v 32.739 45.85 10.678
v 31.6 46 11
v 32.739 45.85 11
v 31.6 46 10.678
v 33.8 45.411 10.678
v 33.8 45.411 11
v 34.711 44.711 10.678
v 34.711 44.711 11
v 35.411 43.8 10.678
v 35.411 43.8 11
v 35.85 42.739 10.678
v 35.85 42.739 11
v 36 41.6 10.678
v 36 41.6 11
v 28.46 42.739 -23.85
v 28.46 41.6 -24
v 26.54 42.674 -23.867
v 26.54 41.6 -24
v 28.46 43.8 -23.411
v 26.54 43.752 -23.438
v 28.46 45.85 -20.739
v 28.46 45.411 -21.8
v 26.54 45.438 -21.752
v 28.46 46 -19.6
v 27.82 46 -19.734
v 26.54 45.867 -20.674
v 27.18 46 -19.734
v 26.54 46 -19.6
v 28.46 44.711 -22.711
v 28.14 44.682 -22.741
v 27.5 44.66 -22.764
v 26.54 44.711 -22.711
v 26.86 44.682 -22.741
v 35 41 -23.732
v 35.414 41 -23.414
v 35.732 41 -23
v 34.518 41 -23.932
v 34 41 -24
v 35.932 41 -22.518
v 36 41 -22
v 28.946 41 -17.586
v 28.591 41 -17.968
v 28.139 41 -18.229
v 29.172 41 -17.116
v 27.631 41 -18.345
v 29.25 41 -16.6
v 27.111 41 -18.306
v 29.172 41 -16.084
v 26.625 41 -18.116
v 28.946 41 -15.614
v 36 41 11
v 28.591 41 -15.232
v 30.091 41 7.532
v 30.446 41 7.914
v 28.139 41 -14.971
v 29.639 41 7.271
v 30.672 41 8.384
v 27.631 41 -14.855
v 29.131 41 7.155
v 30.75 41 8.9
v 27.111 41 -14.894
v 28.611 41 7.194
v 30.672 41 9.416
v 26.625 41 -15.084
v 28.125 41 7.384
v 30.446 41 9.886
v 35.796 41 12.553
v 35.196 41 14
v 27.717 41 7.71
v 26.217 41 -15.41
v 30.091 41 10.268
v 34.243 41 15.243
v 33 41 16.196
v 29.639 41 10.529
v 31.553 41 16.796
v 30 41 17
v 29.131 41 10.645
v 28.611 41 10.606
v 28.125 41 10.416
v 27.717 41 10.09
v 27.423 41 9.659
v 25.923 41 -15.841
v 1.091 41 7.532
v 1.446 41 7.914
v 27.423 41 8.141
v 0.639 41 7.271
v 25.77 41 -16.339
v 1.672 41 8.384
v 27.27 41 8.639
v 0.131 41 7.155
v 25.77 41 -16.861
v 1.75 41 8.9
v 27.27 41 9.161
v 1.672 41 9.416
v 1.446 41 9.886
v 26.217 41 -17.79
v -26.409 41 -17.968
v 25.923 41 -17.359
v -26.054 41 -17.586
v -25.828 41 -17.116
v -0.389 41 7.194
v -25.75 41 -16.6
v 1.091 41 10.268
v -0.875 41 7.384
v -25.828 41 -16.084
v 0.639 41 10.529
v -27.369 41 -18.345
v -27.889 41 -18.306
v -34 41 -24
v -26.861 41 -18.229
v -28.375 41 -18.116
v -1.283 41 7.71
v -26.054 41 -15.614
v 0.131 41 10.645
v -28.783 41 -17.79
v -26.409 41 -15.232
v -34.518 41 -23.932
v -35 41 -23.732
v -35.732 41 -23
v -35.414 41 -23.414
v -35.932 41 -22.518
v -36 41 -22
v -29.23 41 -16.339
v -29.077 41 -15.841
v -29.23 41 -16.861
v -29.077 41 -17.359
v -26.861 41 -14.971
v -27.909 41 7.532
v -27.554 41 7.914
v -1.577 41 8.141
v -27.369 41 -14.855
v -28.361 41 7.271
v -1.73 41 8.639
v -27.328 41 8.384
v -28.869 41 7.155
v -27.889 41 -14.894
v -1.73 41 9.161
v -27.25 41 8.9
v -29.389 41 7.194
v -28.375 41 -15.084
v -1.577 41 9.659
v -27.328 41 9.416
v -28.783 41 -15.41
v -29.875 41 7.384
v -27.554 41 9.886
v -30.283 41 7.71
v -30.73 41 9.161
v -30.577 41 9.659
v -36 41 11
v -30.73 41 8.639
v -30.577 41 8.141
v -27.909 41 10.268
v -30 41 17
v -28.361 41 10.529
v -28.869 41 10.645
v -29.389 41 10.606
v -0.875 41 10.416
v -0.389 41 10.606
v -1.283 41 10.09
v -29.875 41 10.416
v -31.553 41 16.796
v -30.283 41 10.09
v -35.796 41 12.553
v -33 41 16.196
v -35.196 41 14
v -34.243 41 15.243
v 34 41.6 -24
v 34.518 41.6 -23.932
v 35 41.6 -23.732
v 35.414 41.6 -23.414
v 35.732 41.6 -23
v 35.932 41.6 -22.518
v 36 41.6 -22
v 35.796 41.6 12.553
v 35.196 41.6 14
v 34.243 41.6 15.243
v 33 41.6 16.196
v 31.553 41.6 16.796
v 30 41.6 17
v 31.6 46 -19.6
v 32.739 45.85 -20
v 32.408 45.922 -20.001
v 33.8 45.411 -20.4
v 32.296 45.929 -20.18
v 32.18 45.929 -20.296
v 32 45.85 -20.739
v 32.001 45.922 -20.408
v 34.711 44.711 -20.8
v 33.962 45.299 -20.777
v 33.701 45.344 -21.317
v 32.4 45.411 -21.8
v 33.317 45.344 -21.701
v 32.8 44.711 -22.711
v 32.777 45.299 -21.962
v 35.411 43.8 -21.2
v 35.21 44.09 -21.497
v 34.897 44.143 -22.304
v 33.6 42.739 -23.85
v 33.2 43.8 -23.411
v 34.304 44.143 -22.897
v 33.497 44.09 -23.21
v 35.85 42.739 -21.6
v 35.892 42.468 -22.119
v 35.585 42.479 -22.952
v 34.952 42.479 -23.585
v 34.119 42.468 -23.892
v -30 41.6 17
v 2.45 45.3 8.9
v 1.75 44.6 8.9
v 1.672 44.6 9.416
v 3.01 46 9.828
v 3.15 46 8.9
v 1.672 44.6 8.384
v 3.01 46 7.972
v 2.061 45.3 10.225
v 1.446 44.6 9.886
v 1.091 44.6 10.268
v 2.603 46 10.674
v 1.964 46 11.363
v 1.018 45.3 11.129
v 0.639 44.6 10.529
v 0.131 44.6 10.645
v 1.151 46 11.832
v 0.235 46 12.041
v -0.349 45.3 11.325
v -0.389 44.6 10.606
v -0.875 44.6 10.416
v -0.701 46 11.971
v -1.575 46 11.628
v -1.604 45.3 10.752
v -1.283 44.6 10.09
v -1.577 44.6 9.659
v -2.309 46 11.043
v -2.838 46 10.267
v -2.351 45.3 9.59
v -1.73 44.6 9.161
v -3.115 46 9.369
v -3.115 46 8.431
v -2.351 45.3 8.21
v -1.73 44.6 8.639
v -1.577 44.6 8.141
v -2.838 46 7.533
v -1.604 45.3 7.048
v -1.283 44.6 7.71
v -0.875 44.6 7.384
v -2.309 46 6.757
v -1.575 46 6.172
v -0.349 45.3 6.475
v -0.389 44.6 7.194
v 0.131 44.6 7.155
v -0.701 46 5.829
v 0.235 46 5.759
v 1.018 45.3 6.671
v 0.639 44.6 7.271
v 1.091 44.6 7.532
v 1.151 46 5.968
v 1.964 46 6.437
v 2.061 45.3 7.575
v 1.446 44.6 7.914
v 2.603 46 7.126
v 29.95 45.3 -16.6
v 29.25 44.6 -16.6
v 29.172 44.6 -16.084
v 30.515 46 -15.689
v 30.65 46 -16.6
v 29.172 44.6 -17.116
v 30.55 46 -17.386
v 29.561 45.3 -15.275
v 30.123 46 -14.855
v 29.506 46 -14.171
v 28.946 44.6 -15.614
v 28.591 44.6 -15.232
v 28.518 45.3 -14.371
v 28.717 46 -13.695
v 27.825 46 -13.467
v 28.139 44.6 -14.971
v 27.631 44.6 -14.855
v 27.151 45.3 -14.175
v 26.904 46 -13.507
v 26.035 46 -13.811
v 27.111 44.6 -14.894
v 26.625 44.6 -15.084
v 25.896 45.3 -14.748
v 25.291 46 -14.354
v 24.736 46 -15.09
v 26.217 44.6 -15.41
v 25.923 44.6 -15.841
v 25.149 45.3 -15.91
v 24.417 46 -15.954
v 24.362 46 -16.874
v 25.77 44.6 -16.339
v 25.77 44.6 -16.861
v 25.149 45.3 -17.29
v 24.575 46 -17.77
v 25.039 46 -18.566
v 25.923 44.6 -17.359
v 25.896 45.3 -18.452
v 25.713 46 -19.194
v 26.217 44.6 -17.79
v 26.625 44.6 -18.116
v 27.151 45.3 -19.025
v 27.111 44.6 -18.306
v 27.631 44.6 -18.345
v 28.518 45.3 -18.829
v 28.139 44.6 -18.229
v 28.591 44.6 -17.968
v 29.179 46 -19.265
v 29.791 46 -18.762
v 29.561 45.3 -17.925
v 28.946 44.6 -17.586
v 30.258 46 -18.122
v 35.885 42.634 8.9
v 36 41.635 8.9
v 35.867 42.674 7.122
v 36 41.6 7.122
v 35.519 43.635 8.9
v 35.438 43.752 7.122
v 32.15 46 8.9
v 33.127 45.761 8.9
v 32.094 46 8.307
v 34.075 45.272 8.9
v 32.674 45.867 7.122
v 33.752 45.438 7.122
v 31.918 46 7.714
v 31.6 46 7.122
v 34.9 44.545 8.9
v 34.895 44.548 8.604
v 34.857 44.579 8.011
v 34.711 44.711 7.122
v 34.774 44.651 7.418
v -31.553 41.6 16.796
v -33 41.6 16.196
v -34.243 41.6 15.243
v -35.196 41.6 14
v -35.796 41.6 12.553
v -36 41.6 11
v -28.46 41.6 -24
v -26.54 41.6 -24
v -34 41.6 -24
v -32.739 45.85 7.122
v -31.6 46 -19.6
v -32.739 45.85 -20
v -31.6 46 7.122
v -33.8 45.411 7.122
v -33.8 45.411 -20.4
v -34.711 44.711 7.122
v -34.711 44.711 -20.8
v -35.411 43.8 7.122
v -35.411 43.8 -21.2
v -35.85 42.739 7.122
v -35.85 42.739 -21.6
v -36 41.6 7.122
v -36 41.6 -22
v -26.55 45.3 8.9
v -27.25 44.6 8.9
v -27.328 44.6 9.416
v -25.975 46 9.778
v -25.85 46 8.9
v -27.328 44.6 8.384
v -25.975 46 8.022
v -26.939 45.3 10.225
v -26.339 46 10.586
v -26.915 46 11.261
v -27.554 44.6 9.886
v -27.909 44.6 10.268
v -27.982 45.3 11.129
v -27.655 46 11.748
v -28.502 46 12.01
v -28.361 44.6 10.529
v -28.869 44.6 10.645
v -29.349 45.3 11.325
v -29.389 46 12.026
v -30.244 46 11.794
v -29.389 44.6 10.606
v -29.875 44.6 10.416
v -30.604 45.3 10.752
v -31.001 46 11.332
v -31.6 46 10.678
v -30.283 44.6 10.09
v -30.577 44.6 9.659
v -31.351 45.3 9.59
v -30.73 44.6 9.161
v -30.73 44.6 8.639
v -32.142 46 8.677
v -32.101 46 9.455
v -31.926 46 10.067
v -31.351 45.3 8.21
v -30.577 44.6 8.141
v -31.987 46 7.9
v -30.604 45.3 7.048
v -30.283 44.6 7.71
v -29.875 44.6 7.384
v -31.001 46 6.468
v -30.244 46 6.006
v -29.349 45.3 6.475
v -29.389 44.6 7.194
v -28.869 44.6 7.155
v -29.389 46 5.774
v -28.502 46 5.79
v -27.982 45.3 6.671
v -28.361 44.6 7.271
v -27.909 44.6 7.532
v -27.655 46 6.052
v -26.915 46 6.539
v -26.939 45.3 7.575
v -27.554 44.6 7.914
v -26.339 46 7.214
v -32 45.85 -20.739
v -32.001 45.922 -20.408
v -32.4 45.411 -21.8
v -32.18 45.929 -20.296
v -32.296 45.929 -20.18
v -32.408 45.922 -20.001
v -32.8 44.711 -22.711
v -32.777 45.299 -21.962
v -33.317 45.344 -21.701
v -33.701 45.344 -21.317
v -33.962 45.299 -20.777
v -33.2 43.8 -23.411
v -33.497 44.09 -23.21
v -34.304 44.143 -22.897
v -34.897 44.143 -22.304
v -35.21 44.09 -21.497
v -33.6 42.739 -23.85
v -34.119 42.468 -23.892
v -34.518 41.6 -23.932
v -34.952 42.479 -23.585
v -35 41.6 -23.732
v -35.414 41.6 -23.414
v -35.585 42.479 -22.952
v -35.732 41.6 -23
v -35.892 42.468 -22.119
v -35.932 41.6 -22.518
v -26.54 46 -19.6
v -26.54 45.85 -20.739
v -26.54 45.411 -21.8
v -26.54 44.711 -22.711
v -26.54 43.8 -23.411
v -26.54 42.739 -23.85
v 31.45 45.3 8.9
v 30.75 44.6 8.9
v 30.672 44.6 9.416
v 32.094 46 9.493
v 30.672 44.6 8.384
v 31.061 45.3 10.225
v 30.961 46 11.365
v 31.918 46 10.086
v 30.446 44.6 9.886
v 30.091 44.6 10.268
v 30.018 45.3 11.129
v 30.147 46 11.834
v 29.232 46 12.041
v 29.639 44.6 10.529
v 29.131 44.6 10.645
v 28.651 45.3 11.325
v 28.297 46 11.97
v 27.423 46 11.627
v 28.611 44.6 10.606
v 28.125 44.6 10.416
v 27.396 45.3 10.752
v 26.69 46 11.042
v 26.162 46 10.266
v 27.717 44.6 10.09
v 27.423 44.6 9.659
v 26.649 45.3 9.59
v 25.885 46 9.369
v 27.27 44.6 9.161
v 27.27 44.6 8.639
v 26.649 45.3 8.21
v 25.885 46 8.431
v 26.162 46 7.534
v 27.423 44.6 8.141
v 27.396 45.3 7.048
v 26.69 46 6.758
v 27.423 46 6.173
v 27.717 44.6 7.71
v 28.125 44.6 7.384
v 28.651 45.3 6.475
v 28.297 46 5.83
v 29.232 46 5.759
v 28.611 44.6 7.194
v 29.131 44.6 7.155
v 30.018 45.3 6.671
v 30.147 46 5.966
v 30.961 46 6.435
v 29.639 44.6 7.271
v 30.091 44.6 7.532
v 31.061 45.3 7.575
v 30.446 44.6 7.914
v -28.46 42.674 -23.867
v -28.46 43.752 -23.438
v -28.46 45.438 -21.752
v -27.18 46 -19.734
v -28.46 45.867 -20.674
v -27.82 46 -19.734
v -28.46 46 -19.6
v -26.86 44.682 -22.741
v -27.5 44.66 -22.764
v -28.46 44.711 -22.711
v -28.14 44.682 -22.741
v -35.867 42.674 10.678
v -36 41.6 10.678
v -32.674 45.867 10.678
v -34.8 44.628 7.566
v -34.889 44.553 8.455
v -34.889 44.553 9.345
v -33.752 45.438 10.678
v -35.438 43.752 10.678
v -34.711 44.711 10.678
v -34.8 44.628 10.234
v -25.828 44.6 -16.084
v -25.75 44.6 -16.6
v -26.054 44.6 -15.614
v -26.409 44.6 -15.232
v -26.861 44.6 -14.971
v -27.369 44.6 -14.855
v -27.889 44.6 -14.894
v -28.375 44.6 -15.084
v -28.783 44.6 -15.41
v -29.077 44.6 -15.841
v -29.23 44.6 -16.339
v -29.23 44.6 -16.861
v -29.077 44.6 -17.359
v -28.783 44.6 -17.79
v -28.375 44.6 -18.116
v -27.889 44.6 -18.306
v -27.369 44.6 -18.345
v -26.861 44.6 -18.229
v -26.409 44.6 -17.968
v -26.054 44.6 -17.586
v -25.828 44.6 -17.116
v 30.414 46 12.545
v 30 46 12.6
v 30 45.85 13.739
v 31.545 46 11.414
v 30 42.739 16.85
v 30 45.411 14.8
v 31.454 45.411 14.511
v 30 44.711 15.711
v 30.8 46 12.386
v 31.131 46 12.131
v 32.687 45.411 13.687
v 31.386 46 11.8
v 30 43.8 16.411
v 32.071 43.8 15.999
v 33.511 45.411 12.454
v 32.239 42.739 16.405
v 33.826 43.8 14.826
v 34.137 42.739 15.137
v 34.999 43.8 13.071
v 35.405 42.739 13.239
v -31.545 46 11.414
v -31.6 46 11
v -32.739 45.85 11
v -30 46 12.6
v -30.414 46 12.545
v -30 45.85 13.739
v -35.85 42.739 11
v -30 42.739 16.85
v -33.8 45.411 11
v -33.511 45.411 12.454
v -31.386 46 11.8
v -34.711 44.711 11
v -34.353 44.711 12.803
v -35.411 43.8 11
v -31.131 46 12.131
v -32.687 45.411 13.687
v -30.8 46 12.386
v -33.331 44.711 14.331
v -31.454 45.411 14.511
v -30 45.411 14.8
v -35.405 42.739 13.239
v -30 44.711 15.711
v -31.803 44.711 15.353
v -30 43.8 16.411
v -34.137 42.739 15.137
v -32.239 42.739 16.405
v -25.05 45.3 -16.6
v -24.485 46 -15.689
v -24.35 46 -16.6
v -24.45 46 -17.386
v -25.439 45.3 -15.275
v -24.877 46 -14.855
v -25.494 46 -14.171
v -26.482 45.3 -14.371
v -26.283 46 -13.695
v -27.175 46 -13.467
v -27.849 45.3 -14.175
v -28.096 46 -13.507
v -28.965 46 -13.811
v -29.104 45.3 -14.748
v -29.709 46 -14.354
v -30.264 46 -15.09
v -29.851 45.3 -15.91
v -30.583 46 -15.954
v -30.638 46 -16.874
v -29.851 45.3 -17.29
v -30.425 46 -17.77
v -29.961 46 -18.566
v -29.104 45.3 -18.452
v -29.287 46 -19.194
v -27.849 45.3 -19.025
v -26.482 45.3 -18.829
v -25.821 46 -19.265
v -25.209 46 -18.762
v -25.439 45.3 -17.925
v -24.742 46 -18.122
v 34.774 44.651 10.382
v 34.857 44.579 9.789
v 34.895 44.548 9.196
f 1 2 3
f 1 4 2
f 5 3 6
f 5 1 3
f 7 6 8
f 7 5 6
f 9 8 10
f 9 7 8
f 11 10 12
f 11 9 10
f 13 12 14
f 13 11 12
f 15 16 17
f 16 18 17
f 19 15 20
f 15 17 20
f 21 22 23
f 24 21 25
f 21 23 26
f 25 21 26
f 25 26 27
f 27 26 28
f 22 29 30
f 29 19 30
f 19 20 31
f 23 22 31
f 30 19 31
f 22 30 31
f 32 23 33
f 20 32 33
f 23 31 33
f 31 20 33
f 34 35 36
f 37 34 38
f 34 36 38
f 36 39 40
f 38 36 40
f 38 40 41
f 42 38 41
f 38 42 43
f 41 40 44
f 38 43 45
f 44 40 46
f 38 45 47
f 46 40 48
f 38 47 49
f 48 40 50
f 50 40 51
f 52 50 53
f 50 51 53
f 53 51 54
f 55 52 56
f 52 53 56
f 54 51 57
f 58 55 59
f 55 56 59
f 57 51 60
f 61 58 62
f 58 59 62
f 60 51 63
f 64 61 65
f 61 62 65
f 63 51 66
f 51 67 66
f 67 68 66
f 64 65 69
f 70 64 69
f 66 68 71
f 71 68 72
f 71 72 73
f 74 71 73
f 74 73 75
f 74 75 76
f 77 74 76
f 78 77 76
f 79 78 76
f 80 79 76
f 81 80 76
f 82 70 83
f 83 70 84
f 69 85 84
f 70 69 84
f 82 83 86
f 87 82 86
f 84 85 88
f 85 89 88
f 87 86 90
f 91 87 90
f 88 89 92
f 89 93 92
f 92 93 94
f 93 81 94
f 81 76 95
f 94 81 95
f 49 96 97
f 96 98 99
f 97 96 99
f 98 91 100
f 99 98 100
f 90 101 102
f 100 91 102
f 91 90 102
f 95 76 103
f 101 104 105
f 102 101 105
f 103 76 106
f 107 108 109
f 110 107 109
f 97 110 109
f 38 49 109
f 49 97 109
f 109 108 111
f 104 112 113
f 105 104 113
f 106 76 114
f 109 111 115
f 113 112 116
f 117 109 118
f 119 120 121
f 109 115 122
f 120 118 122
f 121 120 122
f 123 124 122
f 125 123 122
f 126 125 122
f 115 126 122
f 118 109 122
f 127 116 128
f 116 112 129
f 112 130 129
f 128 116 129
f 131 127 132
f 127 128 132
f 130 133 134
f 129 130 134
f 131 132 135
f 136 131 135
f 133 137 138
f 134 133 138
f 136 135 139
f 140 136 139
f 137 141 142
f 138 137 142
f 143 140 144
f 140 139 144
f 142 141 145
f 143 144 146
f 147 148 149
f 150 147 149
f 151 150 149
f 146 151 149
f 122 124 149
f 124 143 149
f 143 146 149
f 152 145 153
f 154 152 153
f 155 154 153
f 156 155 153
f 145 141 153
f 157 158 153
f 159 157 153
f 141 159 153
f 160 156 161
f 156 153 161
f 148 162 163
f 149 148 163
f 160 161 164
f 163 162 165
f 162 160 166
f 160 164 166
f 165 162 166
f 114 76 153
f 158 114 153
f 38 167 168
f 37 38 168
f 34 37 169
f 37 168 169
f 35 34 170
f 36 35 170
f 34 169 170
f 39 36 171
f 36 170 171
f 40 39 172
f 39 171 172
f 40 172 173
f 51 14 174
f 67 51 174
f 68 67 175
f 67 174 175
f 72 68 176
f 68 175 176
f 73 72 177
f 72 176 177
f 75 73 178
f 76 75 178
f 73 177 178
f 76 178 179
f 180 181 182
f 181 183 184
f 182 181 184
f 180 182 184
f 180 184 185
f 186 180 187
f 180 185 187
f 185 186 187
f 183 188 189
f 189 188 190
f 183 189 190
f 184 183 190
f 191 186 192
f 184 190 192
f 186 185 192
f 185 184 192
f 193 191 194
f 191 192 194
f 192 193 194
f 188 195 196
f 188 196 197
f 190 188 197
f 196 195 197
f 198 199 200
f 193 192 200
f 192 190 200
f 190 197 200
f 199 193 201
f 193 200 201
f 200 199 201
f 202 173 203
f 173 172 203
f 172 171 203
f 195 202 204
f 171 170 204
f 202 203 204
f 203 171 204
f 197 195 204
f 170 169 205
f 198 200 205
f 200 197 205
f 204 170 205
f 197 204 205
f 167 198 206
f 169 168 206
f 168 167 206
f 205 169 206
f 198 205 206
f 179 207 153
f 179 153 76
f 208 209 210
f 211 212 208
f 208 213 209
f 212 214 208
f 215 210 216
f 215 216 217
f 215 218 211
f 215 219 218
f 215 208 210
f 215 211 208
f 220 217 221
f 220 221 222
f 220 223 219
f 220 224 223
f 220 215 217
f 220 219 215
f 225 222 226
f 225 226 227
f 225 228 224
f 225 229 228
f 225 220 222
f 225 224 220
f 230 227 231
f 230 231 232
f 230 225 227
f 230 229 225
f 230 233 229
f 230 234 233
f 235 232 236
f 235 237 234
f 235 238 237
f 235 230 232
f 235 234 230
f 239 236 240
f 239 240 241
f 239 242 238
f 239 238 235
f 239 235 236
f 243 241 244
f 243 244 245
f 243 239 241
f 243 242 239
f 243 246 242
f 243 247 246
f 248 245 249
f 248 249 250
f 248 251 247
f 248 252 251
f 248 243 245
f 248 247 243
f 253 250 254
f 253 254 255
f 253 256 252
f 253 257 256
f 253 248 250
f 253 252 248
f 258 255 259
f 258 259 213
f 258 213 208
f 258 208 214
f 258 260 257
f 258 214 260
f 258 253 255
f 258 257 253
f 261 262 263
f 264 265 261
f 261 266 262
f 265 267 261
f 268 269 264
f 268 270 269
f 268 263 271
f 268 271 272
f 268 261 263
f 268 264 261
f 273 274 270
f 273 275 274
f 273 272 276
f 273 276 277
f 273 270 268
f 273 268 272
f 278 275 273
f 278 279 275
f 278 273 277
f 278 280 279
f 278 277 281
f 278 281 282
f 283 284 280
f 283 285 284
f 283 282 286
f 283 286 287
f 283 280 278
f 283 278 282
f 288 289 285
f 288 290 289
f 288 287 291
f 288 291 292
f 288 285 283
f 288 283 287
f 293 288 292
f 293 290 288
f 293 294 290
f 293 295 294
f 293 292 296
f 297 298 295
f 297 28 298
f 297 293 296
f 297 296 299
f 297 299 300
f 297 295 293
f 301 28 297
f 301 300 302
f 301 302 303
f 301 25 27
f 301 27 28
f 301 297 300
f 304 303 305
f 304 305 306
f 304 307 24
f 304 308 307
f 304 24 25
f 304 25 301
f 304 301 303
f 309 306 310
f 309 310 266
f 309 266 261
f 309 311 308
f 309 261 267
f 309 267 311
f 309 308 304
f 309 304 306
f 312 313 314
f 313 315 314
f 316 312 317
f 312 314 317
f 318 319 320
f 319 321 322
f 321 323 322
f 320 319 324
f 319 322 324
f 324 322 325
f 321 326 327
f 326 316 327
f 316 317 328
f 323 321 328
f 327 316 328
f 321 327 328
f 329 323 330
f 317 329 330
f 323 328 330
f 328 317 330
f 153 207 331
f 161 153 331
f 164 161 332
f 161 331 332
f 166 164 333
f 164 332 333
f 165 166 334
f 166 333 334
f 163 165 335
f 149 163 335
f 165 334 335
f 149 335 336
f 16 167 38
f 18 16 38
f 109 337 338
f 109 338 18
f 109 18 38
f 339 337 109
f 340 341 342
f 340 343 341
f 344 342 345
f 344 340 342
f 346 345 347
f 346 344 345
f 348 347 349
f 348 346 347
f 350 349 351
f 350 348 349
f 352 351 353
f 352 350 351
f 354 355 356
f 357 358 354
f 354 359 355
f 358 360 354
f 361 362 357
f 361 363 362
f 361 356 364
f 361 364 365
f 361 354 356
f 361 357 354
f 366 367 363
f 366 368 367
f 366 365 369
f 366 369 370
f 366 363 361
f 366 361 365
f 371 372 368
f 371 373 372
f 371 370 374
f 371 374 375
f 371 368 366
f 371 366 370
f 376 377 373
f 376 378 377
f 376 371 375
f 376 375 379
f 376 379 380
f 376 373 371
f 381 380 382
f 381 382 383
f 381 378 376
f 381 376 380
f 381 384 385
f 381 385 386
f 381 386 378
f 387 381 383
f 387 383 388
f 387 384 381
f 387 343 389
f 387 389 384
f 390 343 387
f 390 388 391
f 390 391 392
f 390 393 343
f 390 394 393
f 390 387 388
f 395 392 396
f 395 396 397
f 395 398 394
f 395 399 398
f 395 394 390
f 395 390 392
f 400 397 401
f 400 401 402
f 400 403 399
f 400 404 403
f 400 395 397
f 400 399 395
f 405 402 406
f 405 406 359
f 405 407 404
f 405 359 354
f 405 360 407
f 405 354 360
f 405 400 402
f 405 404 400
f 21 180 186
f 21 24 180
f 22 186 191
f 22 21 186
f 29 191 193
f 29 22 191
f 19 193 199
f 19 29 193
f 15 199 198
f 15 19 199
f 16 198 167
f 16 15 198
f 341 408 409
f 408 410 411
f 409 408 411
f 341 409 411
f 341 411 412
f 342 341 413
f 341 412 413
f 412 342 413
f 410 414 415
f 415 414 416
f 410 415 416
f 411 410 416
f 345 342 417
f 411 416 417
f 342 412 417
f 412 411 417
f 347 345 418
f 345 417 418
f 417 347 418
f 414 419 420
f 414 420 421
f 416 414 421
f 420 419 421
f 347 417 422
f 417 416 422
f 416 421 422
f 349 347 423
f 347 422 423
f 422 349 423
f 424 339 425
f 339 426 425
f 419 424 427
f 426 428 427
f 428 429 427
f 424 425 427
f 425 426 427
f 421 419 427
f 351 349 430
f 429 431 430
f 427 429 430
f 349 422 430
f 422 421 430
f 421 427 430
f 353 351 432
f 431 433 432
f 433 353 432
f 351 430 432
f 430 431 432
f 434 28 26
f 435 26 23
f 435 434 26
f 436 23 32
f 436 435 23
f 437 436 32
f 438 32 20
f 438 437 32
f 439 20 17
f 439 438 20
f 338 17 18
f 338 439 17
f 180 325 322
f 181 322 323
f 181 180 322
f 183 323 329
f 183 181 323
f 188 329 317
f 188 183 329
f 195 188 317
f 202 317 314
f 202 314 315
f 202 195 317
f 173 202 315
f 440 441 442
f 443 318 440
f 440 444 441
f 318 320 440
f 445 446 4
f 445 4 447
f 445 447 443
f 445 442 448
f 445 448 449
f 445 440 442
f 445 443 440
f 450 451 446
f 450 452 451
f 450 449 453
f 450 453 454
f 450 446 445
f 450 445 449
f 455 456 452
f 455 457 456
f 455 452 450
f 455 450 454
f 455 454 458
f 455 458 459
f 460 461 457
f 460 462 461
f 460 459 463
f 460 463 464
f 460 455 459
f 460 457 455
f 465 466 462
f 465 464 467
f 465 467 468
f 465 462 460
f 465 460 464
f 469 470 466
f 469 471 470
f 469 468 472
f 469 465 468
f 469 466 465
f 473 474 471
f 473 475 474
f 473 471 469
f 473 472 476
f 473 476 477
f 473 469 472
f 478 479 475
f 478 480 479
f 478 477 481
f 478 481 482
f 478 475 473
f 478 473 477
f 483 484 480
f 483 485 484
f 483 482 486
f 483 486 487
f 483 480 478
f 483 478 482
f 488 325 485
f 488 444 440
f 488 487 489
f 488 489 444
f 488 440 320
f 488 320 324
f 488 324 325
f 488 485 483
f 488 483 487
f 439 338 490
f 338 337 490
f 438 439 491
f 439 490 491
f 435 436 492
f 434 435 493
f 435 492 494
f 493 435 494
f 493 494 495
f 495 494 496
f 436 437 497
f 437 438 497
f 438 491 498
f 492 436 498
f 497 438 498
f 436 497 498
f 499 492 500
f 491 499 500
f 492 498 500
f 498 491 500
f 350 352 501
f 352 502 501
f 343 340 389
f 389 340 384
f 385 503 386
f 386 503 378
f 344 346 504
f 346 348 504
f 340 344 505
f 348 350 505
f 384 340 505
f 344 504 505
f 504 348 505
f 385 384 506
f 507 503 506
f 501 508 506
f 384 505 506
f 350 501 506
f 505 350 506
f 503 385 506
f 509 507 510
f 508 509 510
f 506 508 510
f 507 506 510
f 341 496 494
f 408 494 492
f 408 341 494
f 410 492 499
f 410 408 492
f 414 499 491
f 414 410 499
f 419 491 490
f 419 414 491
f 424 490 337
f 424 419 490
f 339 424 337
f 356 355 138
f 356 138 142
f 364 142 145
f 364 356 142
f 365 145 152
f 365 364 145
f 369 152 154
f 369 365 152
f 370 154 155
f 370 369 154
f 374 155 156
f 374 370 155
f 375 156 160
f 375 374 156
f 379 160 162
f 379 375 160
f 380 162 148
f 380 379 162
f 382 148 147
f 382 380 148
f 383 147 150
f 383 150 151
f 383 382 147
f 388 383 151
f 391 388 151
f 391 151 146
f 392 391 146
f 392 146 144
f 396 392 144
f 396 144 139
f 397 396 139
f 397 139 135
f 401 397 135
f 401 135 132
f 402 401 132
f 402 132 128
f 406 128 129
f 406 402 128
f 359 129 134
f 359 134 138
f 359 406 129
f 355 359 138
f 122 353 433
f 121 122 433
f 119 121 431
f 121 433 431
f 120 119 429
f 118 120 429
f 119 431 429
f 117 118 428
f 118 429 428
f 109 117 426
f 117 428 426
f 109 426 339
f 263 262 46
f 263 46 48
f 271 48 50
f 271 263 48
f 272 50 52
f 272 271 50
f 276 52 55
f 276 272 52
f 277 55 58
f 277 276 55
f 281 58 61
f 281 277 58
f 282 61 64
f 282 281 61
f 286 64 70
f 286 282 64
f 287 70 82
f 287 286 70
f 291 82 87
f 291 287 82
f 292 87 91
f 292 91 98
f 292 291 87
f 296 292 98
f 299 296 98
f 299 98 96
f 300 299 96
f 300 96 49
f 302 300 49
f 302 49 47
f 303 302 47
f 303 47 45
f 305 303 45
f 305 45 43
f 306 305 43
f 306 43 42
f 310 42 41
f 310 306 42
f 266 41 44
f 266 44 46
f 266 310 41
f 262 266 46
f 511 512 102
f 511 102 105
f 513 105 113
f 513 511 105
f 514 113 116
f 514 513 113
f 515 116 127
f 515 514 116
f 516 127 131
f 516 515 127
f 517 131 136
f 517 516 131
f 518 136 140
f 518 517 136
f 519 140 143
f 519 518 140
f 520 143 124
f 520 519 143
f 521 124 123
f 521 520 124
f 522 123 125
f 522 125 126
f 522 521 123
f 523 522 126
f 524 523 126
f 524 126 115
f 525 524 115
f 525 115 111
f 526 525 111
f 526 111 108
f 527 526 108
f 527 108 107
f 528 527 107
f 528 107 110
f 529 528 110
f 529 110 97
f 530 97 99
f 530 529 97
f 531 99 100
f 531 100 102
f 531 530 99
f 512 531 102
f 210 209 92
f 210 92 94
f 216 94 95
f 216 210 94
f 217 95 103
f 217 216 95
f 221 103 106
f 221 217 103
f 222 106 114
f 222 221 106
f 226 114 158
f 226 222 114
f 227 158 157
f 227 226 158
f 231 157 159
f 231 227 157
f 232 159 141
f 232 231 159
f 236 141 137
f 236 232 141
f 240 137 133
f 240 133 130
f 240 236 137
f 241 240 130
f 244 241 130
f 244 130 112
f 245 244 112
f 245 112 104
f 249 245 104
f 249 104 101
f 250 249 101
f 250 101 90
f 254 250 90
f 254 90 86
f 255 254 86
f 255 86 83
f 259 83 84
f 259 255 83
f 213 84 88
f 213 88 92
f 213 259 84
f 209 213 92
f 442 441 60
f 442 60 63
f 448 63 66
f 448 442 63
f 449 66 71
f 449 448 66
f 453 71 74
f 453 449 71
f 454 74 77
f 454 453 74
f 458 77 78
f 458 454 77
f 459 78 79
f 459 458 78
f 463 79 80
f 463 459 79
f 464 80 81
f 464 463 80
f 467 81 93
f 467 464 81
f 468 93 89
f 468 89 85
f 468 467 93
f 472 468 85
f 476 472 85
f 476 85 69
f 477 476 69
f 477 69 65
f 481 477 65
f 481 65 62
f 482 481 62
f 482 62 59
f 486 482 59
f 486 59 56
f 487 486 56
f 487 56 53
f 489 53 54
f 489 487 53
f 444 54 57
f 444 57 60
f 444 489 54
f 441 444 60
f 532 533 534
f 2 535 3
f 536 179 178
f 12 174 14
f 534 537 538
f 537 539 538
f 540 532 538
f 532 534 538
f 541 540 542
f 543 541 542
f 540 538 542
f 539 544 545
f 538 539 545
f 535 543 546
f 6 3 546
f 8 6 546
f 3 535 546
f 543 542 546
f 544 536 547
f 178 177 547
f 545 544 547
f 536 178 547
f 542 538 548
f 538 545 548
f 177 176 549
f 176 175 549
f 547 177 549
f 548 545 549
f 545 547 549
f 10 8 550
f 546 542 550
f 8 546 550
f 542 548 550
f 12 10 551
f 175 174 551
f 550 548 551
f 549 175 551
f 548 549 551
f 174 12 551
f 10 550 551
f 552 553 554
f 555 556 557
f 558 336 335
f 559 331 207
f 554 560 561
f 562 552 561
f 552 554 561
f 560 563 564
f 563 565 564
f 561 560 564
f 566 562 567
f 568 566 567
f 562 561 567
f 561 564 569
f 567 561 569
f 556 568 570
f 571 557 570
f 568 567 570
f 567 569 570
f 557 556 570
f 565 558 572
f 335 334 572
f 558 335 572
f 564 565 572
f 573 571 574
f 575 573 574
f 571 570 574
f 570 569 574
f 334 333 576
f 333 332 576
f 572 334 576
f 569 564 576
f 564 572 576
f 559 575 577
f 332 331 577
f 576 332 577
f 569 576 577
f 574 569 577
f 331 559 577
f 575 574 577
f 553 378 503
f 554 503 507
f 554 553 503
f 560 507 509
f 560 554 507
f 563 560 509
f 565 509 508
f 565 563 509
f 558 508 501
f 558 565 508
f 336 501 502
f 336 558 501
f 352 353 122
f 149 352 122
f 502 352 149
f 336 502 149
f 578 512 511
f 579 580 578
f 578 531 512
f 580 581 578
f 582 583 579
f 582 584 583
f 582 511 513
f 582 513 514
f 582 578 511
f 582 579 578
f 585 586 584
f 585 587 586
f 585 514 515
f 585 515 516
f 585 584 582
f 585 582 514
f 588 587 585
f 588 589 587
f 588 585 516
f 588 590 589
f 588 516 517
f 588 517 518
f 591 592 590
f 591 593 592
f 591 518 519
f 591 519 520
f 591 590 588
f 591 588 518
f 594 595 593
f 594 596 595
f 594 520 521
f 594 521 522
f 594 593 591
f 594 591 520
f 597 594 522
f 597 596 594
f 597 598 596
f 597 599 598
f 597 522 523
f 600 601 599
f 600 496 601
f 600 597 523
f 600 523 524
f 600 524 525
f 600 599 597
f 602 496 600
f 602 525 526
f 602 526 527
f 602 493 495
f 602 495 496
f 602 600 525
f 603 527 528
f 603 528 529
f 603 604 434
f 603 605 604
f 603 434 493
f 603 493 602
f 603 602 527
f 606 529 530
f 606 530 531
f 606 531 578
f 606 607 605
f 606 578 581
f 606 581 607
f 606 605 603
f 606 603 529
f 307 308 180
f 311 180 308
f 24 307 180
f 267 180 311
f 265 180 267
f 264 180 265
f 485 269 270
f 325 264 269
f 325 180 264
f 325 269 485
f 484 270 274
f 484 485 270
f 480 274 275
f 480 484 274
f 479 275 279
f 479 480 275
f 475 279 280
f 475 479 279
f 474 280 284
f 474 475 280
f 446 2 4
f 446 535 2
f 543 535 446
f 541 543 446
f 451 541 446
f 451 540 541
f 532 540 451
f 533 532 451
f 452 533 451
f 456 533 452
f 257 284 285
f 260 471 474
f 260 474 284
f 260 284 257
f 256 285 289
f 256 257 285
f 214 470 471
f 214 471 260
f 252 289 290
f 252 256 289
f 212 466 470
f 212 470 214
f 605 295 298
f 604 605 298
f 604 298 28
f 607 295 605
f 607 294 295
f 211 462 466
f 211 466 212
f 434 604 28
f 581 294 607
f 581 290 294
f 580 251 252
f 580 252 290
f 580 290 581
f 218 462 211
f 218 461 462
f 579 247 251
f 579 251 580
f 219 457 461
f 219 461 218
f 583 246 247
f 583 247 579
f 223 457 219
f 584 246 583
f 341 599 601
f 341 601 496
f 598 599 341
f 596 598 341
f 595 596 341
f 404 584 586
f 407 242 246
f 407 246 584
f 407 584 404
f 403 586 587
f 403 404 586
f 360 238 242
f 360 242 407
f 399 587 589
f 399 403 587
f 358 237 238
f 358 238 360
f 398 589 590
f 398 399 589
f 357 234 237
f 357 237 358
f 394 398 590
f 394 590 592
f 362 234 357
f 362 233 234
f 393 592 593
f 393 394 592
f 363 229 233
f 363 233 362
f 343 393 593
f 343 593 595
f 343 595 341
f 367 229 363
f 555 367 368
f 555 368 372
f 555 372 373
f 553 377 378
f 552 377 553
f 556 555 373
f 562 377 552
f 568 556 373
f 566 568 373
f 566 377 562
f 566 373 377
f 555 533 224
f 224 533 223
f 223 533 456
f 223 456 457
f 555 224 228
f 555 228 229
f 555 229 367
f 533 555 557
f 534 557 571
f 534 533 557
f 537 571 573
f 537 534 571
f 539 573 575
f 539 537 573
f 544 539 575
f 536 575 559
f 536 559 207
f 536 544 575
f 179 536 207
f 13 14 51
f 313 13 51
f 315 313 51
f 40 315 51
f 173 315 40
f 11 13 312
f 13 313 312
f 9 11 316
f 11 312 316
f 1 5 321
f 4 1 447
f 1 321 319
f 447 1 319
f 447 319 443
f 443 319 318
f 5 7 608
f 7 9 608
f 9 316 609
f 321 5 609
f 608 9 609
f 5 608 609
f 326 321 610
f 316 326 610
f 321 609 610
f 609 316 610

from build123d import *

# Parameters (mm, degrees)
SKETCH032_R  = 1.75
PAD005_DEPTH = 5
CHAMFER_SIZE = 1.4
FILLET002_R  = 4.4


with BuildPart() as part:
    # Sketch032 → Pad005 (new body)
    with BuildSketch(Plane.XZ):
        with BuildLine():
            Line((-30, 17), (30, 17))
            ThreePointArc((36, 11), (34.242641, 15.242641), (30, 17))
            Line((36, 11), (36, -22))
            ThreePointArc((34, -24), (35.414214, -23.414214), (36, -22))
            Line((34, -24), (-34, -24))
            ThreePointArc((-36, -22), (-35.414214, -23.414214), (-34, -24))
            Line((-36, -22), (-36, 11))
            ThreePointArc((-30, 17), (-34.242641, 15.242641), (-36, 11))
        make_face()
        with Locations((-29, 8.9)):
            Circle(SKETCH032_R, mode=Mode.SUBTRACT)
        with Locations((0, 8.9)):
            Circle(SKETCH032_R, mode=Mode.SUBTRACT)
        with Locations((29, 8.9)):
            Circle(SKETCH032_R, mode=Mode.SUBTRACT)
        with Locations((-27.5, -16.6)):
            Circle(SKETCH032_R, mode=Mode.SUBTRACT)
        with Locations((27.5, -16.6)):
            Circle(SKETCH032_R, mode=Mode.SUBTRACT)
    extrude(amount=PAD005_DEPTH)

    # Chamfer
    chamfer_edges = [part.edges().sort_by_distance(p)[0] for p in [
        (25.75, 0, -16.6),
        (-30.75, 0, 8.9),
        (-1.75, 0, 8.9),
        (27.25, 0, 8.9),
        (-29.25, 0, -16.6),
    ]]
    chamfer(chamfer_edges, length=CHAMFER_SIZE)

    # Fillet002
    fillet002_edges = [part.edges().sort_by_distance(p)[0] for p in [
        (36, 0, -5.5),
        (34.242641, 0, 15.242641),
        (0, 0, 17),
        (-34.242641, 0, 15.242641),
        (-36, 0, -5.5),
        (-35.414214, 0, -23.414214),
        (0, 0, -24),
        (35.414214, 0, -23.414214),
    ]]
    fillet(fillet002_edges, radius=FILLET002_R)


with BuildPart() as part_1:
    # Body placement: moved
    add(part.part.moved(Location((0, 46, 0))))


solid = part_1.part
